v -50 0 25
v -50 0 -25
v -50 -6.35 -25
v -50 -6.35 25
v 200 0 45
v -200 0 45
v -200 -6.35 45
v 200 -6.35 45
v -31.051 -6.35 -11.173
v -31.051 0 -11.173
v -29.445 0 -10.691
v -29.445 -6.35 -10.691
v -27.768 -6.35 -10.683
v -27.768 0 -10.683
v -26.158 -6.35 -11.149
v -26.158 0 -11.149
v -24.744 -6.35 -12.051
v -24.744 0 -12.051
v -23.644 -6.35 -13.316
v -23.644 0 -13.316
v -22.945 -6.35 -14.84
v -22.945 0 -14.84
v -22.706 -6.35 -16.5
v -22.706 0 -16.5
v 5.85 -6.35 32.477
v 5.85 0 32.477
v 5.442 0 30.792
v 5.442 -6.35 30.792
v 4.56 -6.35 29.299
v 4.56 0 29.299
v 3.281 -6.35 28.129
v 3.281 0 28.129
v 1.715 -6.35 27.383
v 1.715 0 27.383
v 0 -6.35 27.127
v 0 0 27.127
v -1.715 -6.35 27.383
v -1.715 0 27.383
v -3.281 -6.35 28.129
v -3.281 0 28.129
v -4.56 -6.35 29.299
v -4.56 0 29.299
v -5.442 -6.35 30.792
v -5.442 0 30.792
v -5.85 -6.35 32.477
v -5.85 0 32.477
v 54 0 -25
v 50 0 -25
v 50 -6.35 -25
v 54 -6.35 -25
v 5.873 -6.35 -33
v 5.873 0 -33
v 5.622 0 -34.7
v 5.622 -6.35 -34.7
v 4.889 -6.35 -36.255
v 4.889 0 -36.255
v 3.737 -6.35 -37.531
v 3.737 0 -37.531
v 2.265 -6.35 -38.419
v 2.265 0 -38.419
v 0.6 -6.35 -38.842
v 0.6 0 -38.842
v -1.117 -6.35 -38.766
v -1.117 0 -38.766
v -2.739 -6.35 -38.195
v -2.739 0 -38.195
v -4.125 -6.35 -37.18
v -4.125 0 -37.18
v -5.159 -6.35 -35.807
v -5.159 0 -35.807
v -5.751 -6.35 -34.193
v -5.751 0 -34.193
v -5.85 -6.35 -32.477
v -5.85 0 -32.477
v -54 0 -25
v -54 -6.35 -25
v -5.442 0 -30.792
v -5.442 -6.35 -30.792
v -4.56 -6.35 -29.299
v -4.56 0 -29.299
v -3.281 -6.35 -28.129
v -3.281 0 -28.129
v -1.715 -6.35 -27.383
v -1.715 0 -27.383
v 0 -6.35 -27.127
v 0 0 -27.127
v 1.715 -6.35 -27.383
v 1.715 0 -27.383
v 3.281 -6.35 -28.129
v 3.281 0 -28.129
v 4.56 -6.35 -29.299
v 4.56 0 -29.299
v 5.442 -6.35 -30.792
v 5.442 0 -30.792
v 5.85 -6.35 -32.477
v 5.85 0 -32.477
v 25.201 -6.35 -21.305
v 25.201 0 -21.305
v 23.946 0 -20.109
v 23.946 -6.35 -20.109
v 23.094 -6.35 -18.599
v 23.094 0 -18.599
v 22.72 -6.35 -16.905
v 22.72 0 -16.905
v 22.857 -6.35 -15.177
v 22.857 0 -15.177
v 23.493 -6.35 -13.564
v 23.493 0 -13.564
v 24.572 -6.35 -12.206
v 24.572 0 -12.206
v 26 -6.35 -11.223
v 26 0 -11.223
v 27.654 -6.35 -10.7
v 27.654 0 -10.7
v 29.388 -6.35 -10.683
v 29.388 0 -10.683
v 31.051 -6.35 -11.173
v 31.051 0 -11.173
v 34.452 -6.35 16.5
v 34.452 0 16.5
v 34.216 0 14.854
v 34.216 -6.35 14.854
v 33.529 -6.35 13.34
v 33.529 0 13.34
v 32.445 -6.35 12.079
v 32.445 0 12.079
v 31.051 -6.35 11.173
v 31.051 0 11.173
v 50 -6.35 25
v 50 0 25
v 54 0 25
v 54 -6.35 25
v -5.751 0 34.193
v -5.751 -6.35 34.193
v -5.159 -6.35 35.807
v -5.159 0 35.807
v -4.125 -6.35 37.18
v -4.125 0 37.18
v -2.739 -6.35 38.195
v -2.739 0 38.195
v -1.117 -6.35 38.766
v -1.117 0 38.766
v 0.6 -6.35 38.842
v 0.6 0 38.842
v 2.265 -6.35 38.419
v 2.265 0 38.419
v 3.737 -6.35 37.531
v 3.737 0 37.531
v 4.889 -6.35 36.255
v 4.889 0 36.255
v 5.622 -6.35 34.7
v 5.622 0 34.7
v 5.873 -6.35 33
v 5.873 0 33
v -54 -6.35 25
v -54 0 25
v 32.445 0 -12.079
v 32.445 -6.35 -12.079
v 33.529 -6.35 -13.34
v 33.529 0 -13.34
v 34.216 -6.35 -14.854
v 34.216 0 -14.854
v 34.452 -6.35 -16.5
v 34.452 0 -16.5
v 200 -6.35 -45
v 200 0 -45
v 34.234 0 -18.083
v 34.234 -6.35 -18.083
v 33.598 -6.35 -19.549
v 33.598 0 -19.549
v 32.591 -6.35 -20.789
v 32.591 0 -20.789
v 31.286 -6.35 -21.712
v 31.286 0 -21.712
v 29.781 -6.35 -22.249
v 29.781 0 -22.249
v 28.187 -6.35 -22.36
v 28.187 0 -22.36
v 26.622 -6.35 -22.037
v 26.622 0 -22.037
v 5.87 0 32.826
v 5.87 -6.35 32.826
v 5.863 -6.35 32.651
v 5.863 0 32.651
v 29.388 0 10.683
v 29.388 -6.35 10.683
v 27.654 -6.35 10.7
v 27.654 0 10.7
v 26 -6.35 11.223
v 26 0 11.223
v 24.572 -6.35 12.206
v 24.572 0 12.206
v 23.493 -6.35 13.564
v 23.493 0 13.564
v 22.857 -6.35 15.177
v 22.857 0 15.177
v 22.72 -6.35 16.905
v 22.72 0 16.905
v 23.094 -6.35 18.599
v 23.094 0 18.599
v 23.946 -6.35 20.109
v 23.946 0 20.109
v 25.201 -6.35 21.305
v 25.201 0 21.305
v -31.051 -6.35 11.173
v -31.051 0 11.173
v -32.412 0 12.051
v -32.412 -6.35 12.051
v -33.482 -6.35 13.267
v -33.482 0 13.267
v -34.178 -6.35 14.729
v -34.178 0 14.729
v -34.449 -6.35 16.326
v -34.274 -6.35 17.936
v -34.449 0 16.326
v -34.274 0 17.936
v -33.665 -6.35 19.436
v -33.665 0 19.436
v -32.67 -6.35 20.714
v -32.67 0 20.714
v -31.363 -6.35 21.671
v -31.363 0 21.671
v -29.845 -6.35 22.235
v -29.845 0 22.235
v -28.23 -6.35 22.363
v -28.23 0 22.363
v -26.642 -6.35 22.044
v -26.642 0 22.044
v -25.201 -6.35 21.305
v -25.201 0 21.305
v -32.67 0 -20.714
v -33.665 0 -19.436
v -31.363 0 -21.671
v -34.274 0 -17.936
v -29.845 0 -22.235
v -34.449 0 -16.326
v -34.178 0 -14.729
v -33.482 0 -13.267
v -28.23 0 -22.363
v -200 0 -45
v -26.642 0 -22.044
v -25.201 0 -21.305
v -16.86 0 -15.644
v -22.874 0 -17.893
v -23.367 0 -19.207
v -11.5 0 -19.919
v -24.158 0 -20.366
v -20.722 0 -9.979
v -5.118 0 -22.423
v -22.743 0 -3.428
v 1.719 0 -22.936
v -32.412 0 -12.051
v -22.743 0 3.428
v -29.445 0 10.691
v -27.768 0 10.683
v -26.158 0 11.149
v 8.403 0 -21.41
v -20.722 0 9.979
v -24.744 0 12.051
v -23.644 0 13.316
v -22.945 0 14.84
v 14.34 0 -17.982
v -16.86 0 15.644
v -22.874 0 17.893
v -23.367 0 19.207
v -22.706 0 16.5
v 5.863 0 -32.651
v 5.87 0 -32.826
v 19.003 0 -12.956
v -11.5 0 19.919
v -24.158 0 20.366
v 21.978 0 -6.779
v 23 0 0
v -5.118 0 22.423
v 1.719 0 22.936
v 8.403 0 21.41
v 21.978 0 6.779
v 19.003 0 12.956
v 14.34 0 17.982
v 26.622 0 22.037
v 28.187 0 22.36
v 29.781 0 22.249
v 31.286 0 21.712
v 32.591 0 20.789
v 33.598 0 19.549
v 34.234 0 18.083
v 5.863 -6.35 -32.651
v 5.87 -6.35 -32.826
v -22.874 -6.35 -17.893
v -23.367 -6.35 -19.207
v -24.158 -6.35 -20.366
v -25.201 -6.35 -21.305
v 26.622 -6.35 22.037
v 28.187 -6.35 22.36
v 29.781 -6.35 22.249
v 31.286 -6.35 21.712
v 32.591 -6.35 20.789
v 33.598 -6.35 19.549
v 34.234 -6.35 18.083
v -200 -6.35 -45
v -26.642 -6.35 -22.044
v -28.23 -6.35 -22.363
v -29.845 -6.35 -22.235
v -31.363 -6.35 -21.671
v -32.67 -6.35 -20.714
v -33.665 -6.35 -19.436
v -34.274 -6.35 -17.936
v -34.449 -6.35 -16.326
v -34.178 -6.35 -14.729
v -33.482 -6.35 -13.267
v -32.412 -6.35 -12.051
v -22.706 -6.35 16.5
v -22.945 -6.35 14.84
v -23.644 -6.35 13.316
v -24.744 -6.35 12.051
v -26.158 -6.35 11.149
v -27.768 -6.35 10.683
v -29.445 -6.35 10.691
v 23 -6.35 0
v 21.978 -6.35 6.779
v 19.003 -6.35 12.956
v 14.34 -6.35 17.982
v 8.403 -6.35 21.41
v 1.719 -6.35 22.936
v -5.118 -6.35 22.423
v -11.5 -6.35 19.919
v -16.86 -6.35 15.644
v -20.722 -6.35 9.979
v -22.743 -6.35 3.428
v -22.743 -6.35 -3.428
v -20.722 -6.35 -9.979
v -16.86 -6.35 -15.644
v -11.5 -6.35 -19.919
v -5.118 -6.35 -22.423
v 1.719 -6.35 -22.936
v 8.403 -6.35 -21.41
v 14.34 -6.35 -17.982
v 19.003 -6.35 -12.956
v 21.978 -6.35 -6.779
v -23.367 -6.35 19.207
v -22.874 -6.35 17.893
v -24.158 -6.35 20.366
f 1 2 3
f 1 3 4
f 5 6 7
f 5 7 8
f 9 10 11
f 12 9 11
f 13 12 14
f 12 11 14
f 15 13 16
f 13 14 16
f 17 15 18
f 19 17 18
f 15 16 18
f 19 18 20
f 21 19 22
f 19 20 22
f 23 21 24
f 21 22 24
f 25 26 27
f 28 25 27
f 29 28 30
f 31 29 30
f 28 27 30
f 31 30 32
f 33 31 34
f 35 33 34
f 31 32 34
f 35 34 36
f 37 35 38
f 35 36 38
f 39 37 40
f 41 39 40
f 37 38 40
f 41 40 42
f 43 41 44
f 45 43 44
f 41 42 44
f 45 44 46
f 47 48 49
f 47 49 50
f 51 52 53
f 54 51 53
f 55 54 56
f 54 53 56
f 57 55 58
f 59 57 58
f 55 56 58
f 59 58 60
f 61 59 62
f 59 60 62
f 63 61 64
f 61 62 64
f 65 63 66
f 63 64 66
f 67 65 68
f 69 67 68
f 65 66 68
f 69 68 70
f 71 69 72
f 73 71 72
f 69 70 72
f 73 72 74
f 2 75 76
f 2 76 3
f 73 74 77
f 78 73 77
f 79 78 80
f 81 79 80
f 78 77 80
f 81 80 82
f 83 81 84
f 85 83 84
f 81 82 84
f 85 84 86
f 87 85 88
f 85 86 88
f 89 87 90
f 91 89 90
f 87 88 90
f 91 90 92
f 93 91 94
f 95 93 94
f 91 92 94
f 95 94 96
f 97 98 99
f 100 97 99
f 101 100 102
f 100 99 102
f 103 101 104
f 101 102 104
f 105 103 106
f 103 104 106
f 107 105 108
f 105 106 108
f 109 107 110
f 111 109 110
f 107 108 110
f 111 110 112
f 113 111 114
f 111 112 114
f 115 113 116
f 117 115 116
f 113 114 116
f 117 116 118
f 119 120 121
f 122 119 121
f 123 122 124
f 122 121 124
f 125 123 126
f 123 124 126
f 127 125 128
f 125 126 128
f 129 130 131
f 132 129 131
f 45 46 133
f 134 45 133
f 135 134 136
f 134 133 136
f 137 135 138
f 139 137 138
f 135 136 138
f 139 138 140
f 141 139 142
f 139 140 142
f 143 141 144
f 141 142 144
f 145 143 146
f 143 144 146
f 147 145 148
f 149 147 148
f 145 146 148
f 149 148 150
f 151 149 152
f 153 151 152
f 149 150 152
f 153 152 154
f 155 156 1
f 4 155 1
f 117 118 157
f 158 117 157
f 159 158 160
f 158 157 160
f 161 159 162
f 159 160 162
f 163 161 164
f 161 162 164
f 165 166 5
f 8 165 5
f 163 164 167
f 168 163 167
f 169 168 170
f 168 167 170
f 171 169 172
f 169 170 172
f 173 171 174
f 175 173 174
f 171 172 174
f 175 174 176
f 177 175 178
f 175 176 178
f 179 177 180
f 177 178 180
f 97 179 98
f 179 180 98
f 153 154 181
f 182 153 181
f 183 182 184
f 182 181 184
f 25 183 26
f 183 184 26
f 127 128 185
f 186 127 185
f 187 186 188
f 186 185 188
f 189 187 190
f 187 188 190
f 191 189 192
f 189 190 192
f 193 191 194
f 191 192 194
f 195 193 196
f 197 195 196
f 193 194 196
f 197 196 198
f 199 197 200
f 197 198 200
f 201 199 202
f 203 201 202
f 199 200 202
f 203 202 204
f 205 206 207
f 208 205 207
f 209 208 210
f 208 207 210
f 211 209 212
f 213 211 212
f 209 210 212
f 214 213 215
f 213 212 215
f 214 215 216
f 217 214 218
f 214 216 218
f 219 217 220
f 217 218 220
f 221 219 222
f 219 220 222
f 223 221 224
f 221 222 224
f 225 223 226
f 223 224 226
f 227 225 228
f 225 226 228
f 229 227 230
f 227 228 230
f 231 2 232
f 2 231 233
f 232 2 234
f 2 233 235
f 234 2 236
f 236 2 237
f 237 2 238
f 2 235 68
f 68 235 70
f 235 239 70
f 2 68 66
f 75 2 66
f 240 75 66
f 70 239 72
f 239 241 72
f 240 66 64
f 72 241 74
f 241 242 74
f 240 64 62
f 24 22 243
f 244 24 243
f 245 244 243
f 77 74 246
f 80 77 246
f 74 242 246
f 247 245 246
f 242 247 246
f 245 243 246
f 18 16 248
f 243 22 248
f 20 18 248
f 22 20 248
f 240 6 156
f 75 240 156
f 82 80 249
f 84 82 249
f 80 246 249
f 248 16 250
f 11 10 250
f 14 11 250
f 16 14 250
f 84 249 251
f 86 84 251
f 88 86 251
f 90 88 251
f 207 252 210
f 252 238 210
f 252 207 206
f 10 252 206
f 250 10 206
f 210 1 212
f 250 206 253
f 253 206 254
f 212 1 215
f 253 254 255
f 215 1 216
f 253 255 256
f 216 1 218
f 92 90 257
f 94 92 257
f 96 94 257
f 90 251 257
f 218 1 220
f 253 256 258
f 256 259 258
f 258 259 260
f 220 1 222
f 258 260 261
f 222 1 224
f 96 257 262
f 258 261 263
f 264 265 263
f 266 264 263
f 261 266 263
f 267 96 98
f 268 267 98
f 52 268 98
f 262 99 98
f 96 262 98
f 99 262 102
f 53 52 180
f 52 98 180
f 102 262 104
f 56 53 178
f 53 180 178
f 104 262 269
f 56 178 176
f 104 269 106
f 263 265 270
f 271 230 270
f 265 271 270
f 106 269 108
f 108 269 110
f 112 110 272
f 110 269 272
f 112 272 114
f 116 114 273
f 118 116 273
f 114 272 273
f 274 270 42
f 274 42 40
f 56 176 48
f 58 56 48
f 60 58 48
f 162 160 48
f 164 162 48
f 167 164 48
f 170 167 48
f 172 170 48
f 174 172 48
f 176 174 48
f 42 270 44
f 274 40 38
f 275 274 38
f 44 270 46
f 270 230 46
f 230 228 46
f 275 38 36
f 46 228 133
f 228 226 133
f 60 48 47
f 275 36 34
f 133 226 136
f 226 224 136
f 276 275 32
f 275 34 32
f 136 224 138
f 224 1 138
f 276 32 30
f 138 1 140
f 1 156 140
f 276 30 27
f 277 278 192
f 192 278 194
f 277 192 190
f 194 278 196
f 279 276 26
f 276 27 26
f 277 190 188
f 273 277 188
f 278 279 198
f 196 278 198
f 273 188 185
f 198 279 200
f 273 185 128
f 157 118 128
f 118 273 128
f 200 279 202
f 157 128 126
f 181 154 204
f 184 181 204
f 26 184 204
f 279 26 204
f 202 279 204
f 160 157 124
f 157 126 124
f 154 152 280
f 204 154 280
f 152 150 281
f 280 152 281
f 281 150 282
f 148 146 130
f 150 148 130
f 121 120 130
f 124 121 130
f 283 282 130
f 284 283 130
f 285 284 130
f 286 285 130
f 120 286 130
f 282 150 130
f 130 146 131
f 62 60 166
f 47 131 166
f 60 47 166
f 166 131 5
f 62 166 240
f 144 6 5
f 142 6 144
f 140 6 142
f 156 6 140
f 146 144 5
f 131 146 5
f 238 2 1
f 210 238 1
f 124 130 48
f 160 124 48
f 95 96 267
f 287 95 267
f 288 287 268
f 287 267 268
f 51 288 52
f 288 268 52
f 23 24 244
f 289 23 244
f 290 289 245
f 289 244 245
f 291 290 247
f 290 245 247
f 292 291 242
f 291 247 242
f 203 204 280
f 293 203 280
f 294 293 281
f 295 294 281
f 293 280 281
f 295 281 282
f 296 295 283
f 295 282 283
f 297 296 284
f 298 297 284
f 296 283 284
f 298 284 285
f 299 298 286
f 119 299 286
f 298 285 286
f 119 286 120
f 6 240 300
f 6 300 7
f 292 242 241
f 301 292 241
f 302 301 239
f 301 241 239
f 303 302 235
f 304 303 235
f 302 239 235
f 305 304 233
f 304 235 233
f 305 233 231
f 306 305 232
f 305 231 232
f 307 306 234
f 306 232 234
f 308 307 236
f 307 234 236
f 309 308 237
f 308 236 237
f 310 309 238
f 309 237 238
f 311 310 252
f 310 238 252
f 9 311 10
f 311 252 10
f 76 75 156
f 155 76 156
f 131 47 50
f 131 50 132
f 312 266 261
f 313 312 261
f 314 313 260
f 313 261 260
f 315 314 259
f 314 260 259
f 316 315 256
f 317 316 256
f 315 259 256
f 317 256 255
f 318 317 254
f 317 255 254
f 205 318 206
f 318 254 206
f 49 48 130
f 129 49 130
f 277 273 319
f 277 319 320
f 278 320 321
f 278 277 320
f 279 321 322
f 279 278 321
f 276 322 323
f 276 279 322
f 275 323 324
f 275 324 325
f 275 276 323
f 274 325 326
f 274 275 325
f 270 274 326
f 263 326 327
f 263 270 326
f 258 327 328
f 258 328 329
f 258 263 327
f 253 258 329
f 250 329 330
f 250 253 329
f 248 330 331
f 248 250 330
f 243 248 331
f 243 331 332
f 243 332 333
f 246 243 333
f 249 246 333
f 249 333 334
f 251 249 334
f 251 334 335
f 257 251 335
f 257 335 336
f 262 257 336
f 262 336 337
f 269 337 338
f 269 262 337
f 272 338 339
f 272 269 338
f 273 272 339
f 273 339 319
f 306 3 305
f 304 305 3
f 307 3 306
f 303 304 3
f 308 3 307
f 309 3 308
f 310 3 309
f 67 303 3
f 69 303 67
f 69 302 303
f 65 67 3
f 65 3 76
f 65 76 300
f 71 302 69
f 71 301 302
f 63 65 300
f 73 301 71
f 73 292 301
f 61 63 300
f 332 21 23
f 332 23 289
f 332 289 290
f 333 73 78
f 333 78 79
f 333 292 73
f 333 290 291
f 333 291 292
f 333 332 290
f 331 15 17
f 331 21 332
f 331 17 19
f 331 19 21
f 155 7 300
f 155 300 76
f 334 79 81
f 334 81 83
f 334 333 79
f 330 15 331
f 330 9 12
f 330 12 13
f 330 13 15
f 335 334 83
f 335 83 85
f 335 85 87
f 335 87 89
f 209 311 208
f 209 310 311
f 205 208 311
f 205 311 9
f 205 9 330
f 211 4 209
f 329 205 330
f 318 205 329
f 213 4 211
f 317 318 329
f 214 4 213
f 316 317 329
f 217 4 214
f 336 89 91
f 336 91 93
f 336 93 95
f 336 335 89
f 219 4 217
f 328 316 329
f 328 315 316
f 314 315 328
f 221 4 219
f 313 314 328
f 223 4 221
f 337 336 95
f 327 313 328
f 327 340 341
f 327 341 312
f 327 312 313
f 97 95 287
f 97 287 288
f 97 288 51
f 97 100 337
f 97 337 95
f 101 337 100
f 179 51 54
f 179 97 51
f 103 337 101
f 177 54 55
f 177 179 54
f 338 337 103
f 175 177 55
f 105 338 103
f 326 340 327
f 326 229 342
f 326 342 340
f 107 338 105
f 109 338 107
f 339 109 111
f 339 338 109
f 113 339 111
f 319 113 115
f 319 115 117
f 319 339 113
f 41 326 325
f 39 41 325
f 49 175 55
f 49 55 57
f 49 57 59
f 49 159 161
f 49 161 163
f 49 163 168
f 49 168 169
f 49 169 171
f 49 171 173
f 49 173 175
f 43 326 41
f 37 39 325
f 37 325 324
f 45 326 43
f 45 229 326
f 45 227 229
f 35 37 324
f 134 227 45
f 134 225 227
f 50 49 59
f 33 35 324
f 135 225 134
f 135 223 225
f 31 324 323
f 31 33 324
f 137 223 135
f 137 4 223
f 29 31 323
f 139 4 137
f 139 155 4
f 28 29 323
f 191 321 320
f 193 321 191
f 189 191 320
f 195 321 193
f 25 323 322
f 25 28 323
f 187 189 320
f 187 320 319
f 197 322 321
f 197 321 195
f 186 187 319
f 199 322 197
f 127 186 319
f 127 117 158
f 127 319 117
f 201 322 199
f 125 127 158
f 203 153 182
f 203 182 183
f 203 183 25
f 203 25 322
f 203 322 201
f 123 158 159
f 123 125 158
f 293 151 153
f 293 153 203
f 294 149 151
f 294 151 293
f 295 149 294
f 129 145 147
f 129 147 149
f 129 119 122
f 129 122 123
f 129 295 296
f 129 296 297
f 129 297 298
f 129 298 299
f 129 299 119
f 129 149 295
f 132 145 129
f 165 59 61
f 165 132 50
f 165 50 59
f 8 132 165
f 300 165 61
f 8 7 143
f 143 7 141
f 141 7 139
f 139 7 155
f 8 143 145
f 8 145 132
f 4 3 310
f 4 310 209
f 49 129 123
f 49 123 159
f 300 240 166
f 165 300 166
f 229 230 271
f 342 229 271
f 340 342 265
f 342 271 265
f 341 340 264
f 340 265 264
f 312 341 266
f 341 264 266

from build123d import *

# Parameters (mm, degrees)
F0_W     = 400
F0_H     = 90
F0_W_2   = 4
F0_H_2   = 50
F0_R     = 23
F1_DEPTH = 6.35


with BuildPart() as f1:
    # F0 (on Front) → F1 (new body)
    with BuildSketch(Plane.XZ):
        Rectangle(F0_W, F0_H)
        with Locations((-52, 0)):
            Rectangle(F0_W_2, F0_H_2, mode=Mode.SUBTRACT)
        with BuildLine():
            ThreePointArc((31.051097, 11.172706), (32.509123, 5.670705), (33, 0))
            ThreePointArc((33, 0), (32.509123, -5.670705), (31.051097, -11.172706))
            ThreePointArc((31.051097, -11.172706), (33.529177, -13.339893), (34.451838, -16.5))
            ThreePointArc((34.451838, -16.5), (31.285904, -21.711902), (25.201396, -21.304686))
            ThreePointArc((25.201396, -21.304686), (16.5, -28.578838), (5.849702, -32.477392))
            ThreePointArc((5.849702, -32.477392), (5.867172, -32.738436), (5.873, -33))
            ThreePointArc((5.873, -33), (-0.261564, -38.867172), (-5.849702, -32.477392))
            ThreePointArc((-5.849702, -32.477392), (-16.5, -28.578838), (-25.201396, -21.304686))
            ThreePointArc((-25.201396, -21.304686), (-33.665005, -19.4365), (-31.051097, -11.172706))
            ThreePointArc((-31.051097, -11.172706), (-33, 0), (-31.051097, 11.172706))
            ThreePointArc((-31.051097, 11.172706), (-33.665005, 19.4365), (-25.201396, 21.304686))
            ThreePointArc((-25.201396, 21.304686), (-16.5, 28.578838), (-5.849702, 32.477392))
            ThreePointArc((-5.849702, 32.477392), (-0.261564, 38.867172), (5.873, 33))
            ThreePointArc((5.873, 33), (5.867172, 32.738436), (5.849702, 32.477392))
            ThreePointArc((5.849702, 32.477392), (16.5, 28.578838), (25.201396, 21.304686))
            ThreePointArc((25.201396, 21.304686), (31.285904, 21.711902), (34.451838, 16.5))
            ThreePointArc((34.451838, 16.5), (33.529177, 13.339893), (31.051097, 11.172706))
        make_face(mode=Mode.SUBTRACT)
        with Locations((52, 0)):
            Rectangle(F0_W_2, F0_H_2, mode=Mode.SUBTRACT)
        with BuildLine():
            ThreePointArc((31.051097, -11.172706), (32.509123, -5.670705), (33, 0))
            ThreePointArc((33, 0), (32.509123, 5.670705), (31.051097, 11.172706))
            ThreePointArc((31.051097, 11.172706), (23.492671, 13.5635), (25.201396, 21.304686))
            ThreePointArc((25.201396, 21.304686), (16.5, 28.578838), (5.849702, 32.477392))
            ThreePointArc((5.849702, 32.477392), (0, 27.127), (-5.849702, 32.477392))
            ThreePointArc((-5.849702, 32.477392), (-16.5, 28.578838), (-25.201396, 21.304686))
            ThreePointArc((-25.201396, 21.304686), (-23.366936, 19.207066), (-22.705838, 16.5))
            ThreePointArc((-22.705838, 16.5), (-25.418731, 11.549661), (-31.051097, 11.172706))
            ThreePointArc((-31.051097, 11.172706), (-33, 0), (-31.051097, -11.172706))
            ThreePointArc((-31.051097, -11.172706), (-25.418731, -11.549661), (-22.705838, -16.5))
            ThreePointArc((-22.705838, -16.5), (-23.366936, -19.207066), (-25.201396, -21.304686))
            ThreePointArc((-25.201396, -21.304686), (-16.5, -28.578838), (-5.849702, -32.477392))
            ThreePointArc((-5.849702, -32.477392), (0, -27.127), (5.849702, -32.477392))
            ThreePointArc((5.849702, -32.477392), (16.5, -28.578838), (25.201396, -21.304686))
            ThreePointArc((25.201396, -21.304686), (23.492671, -13.5635), (31.051097, -11.172706))
        make_face()
        Circle(F0_R, mode=Mode.SUBTRACT)
    extrude(amount=F1_DEPTH)


solid = f1.part
